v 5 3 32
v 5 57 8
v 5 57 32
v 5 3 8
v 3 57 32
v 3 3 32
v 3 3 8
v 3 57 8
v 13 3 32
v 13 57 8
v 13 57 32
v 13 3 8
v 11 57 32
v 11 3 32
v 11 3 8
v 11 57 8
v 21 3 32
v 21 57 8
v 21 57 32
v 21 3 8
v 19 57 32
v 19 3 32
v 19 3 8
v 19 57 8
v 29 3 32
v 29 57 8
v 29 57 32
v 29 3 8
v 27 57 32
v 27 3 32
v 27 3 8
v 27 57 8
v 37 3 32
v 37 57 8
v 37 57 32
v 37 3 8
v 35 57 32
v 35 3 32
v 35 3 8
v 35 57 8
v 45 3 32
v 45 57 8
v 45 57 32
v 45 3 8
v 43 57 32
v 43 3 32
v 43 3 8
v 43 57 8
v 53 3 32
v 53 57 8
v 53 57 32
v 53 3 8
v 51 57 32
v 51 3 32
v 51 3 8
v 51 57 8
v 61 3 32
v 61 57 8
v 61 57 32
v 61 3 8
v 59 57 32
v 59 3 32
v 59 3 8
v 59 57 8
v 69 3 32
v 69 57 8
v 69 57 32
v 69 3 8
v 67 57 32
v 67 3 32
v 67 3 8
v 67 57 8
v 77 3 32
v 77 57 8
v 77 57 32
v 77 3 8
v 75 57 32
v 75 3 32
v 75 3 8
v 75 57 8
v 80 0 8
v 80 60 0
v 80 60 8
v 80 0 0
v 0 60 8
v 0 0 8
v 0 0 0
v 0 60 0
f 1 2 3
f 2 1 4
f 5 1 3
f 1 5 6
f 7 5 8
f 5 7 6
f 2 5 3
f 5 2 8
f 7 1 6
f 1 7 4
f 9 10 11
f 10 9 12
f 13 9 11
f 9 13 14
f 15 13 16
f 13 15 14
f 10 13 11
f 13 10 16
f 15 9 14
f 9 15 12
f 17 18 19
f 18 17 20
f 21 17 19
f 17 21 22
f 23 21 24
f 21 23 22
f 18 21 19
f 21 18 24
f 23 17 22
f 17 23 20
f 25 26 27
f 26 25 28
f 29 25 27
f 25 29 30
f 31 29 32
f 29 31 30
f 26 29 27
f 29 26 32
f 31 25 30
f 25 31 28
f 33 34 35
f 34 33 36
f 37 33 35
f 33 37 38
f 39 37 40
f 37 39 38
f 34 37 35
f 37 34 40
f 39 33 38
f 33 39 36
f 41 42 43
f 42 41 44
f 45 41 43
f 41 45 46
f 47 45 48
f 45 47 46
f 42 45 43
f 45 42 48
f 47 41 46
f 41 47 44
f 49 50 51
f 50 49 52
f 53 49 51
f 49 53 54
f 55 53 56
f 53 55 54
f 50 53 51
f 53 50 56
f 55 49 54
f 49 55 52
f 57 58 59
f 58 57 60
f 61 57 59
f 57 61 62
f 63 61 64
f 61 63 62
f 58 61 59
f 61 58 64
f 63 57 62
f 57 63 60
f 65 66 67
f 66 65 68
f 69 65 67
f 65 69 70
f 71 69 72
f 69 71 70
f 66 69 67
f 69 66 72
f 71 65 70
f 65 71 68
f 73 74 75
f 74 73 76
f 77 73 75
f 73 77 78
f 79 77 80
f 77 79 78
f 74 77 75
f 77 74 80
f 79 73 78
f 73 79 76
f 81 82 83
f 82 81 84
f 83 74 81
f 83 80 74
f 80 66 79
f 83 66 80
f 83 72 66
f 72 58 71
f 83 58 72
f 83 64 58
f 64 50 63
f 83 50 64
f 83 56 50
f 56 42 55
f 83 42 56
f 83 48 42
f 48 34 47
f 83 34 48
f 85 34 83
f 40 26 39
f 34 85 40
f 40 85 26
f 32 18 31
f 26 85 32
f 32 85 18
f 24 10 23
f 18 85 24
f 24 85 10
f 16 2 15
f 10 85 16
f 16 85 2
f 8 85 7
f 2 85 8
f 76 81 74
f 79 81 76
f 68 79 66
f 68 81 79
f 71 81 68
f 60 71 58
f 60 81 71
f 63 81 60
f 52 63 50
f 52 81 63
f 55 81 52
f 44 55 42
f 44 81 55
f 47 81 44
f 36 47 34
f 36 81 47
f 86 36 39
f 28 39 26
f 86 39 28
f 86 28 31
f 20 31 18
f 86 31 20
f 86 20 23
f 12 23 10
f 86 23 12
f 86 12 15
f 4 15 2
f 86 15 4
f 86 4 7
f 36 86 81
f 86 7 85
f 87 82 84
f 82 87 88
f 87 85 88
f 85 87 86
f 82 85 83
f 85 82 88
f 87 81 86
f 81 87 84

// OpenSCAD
$fn = 32;

// ----------------------------------------------------------------------
// Heatsink: uniform fin block
// ----------------------------------------------------------------------

// --- parameters (mm) ---
base_l = 80;              // base length, X
base_w = 60;              // base width, Y
base_t = 8;               // base plate thickness
fin_h = 25;               // fin height above the base
fin_t = 2;                // fin thickness
edge = 3;                 // margin from the base ends
pitch = 8;                // fin pitch

n_fins = floor((base_l - 2 * edge - fin_t) / pitch) + 1;  // fin count
total_h = base_t + fin_h - 1;  // overall height

union() {
  cube([base_l, base_w, base_t]);
  for (i = [0 : n_fins - 1])
    translate([edge + i * pitch, edge, base_t - 1])
      cube([fin_t, base_w - 2 * edge, fin_h]);
}
